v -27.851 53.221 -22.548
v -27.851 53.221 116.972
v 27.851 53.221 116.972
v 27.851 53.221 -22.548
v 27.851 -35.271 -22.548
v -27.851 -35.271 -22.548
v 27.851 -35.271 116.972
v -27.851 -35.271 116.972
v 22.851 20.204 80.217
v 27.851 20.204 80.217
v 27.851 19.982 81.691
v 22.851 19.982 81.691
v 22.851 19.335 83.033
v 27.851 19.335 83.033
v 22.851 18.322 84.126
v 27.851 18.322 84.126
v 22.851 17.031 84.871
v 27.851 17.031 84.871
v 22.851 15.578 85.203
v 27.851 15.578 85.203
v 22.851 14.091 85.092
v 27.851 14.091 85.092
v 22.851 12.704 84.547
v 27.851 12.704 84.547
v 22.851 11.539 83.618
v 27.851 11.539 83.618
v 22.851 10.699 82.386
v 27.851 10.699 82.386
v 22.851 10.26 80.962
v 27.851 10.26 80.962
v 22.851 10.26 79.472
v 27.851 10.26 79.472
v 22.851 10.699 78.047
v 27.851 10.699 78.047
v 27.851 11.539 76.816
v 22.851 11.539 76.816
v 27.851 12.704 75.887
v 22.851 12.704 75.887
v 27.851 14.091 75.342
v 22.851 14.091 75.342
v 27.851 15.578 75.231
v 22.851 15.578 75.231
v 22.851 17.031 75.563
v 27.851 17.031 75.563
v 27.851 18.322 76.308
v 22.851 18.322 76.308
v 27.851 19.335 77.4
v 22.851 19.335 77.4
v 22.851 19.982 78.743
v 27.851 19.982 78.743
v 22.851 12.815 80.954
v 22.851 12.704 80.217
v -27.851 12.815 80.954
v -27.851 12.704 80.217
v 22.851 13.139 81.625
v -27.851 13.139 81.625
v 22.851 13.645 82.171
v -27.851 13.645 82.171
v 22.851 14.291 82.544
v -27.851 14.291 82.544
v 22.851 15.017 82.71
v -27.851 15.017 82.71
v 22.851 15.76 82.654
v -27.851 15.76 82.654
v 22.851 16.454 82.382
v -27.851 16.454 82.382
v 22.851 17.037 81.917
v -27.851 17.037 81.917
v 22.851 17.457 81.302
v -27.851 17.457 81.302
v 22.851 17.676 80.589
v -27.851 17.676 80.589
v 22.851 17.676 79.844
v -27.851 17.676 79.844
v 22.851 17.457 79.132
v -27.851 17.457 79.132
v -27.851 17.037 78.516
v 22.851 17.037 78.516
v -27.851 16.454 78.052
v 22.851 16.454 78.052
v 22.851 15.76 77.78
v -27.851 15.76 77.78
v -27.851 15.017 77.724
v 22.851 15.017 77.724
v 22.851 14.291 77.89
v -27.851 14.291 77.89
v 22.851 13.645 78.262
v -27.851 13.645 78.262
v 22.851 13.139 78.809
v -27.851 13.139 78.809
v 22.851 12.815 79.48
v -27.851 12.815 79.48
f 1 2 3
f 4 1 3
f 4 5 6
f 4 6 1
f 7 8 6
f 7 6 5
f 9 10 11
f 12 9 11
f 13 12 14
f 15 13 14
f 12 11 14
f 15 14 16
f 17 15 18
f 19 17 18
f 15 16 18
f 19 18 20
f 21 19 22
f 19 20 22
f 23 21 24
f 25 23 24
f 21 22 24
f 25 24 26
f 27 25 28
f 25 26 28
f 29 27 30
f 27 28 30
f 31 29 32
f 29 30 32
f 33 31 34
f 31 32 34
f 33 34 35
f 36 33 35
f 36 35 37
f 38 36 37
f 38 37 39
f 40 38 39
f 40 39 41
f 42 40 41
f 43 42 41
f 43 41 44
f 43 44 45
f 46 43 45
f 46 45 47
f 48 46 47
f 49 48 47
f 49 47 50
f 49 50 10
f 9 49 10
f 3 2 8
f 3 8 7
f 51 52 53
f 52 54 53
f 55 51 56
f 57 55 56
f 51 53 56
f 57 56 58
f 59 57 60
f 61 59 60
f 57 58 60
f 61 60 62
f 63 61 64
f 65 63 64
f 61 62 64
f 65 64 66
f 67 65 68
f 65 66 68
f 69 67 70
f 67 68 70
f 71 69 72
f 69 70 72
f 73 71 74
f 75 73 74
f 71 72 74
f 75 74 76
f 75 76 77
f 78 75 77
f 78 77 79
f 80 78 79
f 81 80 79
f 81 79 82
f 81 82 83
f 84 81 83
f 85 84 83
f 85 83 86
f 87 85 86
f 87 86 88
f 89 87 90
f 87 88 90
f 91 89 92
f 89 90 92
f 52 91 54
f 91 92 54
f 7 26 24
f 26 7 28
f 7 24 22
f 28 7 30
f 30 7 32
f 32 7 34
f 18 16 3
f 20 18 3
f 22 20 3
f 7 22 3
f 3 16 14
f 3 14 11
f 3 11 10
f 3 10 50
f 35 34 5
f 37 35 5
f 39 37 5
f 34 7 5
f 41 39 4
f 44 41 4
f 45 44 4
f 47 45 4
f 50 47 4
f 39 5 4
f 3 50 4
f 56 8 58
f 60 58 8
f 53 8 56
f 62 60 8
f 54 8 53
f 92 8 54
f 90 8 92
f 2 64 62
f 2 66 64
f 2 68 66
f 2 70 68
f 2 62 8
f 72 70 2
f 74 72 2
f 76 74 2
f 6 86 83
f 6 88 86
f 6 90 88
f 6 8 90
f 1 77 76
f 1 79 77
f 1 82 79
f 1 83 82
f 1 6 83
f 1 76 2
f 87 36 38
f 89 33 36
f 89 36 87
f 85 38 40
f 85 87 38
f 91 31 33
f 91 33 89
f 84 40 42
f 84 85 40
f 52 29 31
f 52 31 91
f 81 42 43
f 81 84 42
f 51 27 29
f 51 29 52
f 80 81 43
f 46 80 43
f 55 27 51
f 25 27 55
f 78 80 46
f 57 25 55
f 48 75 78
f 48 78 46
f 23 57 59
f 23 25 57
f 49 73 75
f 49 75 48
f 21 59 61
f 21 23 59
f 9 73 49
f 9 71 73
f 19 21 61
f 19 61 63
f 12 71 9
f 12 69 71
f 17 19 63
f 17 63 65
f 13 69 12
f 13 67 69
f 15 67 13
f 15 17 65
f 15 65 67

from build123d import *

# Parameters (mm, degrees)
F0_W           = 88.491708
F0_H           = 117.230378
F1_DEPTH       = 27.850658
F1_FACE_W      = 55.701316
F1_FACE_H      = 88.491708
F2_DEPTH       = 22.289542
F4_D           = 5
F4_CBORE_D     = 10
F4_CBORE_DEPTH = 5


with BuildPart() as f1:
    # F0 (on Right) → F1 (new body, symmetric)
    with BuildSketch(Plane.YZ):
        with Locations((8.974858, 36.06699)):
            Rectangle(F0_W, F0_H)
    extrude(amount=F1_DEPTH, both=True)

    # F1_face (on face) → F2 (join)
    with BuildSketch(Plane(origin=(0, 8.974858, 94.682179), x_dir=(1, 0, 0), z_dir=(0, 0, 1))):
        Rectangle(F1_FACE_W, F1_FACE_H)
    extrude(amount=F2_DEPTH)

    # F4 (through all)
    with Locations(Plane.YZ.offset(27.850658)):
        with Locations((15.204102, 80.216892)):
            CounterBoreHole(F4_D / 2, F4_CBORE_D / 2, F4_CBORE_DEPTH)


solid = f1.part
